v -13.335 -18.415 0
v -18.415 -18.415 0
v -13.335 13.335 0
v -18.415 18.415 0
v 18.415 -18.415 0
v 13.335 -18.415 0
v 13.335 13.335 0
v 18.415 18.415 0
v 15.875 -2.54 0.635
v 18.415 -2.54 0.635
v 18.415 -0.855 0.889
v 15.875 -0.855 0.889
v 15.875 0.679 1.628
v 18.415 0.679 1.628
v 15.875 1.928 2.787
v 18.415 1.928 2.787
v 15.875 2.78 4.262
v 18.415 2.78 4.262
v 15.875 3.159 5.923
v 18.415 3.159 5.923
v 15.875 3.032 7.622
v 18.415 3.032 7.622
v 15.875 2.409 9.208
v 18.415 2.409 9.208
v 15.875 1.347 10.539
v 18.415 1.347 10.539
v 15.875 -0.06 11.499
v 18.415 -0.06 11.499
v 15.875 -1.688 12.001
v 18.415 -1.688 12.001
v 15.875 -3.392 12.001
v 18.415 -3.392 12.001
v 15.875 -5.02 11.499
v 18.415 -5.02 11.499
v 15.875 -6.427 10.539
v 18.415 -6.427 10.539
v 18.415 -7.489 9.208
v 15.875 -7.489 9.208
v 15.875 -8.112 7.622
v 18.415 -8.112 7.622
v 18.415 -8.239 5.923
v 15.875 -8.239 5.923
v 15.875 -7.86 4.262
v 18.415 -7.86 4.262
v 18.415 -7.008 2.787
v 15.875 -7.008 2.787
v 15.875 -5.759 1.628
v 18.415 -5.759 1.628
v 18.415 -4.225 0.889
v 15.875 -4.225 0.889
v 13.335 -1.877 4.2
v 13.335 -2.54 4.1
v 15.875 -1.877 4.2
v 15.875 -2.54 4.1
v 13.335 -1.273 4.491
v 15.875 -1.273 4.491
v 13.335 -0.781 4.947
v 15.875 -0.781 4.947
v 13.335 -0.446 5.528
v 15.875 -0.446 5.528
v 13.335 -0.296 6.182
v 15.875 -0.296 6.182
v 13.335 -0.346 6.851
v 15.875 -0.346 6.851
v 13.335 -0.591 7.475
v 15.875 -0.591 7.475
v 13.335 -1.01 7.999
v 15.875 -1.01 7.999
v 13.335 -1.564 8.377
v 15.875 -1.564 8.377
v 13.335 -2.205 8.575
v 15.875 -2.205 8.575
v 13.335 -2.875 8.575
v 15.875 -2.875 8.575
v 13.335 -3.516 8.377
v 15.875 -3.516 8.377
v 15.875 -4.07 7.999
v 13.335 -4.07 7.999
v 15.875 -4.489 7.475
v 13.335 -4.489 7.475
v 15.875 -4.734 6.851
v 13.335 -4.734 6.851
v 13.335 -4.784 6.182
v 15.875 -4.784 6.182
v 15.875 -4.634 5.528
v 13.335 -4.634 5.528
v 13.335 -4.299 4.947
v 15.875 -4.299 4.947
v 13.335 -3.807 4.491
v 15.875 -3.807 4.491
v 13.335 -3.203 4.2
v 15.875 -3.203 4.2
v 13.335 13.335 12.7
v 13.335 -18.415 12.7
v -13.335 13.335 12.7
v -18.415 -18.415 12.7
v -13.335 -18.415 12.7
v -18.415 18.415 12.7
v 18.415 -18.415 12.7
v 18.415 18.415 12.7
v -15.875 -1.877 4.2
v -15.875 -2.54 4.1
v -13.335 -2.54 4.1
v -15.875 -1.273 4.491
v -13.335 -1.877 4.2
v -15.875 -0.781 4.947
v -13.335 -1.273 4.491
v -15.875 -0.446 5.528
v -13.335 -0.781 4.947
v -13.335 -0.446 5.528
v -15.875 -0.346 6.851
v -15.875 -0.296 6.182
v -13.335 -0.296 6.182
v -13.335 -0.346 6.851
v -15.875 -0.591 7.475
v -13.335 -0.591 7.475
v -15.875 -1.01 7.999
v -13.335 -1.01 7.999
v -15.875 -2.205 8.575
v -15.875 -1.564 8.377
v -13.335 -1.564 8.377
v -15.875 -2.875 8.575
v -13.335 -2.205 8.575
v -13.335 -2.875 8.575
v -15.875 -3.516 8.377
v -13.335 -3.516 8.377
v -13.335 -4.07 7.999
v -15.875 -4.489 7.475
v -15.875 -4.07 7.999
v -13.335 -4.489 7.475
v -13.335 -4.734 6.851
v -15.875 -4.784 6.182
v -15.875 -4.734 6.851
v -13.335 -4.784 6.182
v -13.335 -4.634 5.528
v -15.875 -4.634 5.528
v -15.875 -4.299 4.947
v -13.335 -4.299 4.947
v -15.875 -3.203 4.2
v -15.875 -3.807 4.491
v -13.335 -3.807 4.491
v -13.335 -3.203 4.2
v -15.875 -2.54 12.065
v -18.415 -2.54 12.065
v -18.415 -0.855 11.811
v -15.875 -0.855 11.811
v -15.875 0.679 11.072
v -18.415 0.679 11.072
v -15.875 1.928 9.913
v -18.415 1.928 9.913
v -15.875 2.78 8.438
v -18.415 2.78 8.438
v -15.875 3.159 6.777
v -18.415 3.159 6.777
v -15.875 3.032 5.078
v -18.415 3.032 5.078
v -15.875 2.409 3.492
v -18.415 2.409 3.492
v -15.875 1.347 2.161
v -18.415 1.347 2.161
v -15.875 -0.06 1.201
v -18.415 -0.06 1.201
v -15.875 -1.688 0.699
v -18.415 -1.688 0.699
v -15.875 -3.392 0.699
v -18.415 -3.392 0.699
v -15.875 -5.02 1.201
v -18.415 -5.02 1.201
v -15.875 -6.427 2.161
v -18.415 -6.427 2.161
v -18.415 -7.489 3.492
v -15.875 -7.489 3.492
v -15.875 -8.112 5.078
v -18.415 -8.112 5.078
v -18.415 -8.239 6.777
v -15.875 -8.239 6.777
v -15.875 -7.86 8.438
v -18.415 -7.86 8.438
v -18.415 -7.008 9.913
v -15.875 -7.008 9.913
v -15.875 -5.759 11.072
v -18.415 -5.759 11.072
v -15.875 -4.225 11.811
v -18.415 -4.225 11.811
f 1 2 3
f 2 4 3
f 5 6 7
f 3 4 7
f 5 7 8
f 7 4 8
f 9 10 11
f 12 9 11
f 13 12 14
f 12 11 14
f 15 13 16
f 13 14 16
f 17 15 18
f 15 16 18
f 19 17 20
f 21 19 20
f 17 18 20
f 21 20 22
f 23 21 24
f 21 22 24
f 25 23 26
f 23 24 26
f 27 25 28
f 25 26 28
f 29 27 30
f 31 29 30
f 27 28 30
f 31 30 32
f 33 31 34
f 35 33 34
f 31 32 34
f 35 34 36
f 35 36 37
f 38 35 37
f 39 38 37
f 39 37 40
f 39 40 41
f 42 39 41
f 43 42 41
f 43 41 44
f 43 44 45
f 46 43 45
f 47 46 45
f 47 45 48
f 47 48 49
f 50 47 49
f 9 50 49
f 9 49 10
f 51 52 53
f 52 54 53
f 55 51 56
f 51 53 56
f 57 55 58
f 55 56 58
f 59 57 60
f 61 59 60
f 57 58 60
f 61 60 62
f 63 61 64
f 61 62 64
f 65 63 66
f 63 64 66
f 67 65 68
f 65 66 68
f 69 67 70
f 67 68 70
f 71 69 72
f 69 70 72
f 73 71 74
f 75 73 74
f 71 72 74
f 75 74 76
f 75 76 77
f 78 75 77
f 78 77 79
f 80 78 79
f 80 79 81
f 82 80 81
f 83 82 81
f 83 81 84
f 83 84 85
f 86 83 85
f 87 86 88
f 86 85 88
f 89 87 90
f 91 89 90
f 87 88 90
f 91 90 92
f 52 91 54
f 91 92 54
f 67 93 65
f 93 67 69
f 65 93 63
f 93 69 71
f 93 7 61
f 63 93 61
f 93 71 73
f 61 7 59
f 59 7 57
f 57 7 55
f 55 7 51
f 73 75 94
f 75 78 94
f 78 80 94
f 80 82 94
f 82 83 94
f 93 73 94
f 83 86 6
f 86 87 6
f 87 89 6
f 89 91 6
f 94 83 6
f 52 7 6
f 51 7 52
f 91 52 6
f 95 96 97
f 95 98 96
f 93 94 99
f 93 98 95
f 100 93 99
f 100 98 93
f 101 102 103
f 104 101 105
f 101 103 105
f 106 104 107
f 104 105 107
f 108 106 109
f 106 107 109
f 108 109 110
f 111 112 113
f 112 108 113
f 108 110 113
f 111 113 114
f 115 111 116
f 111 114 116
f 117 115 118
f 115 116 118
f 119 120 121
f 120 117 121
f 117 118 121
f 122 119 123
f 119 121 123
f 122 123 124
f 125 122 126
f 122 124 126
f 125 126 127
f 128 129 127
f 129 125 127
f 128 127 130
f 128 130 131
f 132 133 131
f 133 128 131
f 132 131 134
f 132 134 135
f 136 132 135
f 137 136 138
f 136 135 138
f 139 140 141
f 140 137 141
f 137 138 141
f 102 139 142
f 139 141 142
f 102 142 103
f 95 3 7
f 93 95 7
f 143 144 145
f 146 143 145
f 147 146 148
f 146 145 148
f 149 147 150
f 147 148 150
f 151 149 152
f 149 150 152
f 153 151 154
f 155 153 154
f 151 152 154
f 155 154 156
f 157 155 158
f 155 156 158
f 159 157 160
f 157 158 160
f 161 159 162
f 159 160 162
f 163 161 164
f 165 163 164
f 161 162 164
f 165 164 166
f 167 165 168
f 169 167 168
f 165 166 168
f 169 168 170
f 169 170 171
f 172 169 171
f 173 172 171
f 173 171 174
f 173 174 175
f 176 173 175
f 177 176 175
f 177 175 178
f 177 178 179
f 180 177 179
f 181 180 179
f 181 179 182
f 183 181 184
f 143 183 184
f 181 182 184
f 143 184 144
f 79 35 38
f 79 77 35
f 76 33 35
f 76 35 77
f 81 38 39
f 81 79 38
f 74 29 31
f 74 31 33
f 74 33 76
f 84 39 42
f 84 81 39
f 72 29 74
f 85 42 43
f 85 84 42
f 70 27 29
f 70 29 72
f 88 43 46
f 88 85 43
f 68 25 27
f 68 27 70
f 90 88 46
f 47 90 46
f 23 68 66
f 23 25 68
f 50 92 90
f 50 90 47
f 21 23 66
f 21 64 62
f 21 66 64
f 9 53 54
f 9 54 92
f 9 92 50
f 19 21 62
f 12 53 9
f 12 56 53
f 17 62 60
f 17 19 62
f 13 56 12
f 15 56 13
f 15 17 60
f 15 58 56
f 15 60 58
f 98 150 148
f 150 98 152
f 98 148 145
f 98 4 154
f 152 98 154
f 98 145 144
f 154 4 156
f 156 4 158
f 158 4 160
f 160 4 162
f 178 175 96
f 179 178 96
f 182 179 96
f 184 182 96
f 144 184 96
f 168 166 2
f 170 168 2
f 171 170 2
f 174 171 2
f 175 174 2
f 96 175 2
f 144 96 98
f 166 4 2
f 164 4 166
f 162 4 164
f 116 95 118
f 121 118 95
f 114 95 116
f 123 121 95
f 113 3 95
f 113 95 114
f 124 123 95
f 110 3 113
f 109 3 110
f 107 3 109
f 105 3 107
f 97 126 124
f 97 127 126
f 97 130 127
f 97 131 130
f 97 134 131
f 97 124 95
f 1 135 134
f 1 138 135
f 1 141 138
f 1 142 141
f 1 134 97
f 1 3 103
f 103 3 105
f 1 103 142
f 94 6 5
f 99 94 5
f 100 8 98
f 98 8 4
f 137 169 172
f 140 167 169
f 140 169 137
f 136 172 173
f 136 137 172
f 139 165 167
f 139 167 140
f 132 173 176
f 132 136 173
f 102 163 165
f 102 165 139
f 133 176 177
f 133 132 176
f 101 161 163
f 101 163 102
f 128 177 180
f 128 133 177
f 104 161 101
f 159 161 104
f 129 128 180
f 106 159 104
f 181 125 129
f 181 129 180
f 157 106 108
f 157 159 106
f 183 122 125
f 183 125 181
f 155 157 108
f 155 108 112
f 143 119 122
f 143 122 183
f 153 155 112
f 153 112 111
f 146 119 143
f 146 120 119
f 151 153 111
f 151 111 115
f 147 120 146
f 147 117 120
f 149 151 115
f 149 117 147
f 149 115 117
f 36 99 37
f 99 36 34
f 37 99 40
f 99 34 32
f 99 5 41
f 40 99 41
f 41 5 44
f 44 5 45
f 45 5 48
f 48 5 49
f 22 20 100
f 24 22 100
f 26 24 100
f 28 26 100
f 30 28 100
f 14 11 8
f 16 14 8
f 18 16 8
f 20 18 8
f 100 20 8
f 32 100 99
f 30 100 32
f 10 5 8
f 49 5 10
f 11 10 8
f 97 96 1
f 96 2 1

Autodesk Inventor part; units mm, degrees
ref_plane "YZ Plane" through (0, 0, 0) normal (1, 0, 0) x (0, 1, 0)
ref_plane "XZ Plane" through (0, 0, 0) normal (0, 1, 0) x (-1, 0, 0)
ref_plane "XY Plane" through (0, 0, 0) normal (0, 0, 1) x (1, 0, 0)
sketch "Sketch1" plane through (0, 0, 0) normal (0, 0, 1) x (1, 0, 0)
  line L0 (13.335, -13.335) -> (-13.335, -13.335) construction
  line L1 (-13.335, -13.335) -> (-13.335, 13.335)
  line L2 (-13.335, 13.335) -> (13.335, 13.335)
  line L3 (13.335, 13.335) -> (13.335, -13.335)
  line L4 (13.335, -13.335) -> (-13.335, 13.335) construction
  line L5 (-13.335, -13.335) -> (13.335, 13.335) construction
  line L6 (18.415, 18.415) -> (-18.415, 18.415)
  line L7 (-18.415, 18.415) -> (-18.415, -18.415)
  line L8 (-18.415, -18.415) -> (18.415, -18.415)
  line L9 (18.415, -18.415) -> (18.415, 18.415)
  line L10 (-13.335, -13.335) -> (-13.335, -18.415)
  line L11 (13.335, -13.335) -> (13.335, -18.415)
  point P0 (0, 0)
  dimension "d0" = 26.67
  dimension "d1" = 26.67
  dimension "d2" = 5.08
extrude "Extrusion1" add sketch "Sketch1" along normal blind 12.7 contours L10 L8 L7 L6 L9 L11 L3 L2 L1
sketch "Sketch2" plane through (18.415, -18.415, 0) normal (1, 0, 0) x (0, 0, -1)
  line L0 (0, 0) -> (0, 36.83) projected
  line L1 (0, 36.83) -> (-12.7, 36.83) projected
  line L2 (-12.7, 0) -> (-12.7, 36.83) projected
  line L3 (0, 0) -> (-12.7, 0) projected
  line L4 (0, 36.83) -> (-12.7, 36.83) construction
  line L5 (-6.35, 36.83) -> (-6.35, 0) construction
  line L6 (0, 0) -> (-12.7, 0) construction
  line L7 (0, 31.75) -> (-12.7, 31.75) construction
  line L8 (-12.7, 0) -> (-12.7, 31.75) construction
  line L9 (-12.7, 15.875) -> (0, 15.875) construction
  line L10 (0, 0) -> (0, 31.75) construction
  circle A0 centre (-6.35, 15.875) radius 2.25
  circle A1 centre (-6.35, 15.875) radius 5.715
  point P0 (0, 18.415)
  dimension "d5" = 4.5
  dimension "d6" = 11.43
extrude "Extrusion2" cut sketch "Sketch2" against normal through all contours A0
extrude "Extrusion3" cut sketch "Sketch2" against normal blind 2.54 contours A1
sketch "Sketch3" plane through (-18.415, -18.415, 0) normal (-1, 0, 0) x (0, 0, 1)
  circle A0 centre (6.35, 15.875) radius 2.25 projected
  circle A1 centre (6.35, 15.875) radius 5.715
  point P0 (0, 18.415)
  dimension "d11" = 11.43
extrude "Extrusion4" cut sketch "Sketch3" against normal blind 2.54
properties part number "Inner_Tube_Endcap2"
